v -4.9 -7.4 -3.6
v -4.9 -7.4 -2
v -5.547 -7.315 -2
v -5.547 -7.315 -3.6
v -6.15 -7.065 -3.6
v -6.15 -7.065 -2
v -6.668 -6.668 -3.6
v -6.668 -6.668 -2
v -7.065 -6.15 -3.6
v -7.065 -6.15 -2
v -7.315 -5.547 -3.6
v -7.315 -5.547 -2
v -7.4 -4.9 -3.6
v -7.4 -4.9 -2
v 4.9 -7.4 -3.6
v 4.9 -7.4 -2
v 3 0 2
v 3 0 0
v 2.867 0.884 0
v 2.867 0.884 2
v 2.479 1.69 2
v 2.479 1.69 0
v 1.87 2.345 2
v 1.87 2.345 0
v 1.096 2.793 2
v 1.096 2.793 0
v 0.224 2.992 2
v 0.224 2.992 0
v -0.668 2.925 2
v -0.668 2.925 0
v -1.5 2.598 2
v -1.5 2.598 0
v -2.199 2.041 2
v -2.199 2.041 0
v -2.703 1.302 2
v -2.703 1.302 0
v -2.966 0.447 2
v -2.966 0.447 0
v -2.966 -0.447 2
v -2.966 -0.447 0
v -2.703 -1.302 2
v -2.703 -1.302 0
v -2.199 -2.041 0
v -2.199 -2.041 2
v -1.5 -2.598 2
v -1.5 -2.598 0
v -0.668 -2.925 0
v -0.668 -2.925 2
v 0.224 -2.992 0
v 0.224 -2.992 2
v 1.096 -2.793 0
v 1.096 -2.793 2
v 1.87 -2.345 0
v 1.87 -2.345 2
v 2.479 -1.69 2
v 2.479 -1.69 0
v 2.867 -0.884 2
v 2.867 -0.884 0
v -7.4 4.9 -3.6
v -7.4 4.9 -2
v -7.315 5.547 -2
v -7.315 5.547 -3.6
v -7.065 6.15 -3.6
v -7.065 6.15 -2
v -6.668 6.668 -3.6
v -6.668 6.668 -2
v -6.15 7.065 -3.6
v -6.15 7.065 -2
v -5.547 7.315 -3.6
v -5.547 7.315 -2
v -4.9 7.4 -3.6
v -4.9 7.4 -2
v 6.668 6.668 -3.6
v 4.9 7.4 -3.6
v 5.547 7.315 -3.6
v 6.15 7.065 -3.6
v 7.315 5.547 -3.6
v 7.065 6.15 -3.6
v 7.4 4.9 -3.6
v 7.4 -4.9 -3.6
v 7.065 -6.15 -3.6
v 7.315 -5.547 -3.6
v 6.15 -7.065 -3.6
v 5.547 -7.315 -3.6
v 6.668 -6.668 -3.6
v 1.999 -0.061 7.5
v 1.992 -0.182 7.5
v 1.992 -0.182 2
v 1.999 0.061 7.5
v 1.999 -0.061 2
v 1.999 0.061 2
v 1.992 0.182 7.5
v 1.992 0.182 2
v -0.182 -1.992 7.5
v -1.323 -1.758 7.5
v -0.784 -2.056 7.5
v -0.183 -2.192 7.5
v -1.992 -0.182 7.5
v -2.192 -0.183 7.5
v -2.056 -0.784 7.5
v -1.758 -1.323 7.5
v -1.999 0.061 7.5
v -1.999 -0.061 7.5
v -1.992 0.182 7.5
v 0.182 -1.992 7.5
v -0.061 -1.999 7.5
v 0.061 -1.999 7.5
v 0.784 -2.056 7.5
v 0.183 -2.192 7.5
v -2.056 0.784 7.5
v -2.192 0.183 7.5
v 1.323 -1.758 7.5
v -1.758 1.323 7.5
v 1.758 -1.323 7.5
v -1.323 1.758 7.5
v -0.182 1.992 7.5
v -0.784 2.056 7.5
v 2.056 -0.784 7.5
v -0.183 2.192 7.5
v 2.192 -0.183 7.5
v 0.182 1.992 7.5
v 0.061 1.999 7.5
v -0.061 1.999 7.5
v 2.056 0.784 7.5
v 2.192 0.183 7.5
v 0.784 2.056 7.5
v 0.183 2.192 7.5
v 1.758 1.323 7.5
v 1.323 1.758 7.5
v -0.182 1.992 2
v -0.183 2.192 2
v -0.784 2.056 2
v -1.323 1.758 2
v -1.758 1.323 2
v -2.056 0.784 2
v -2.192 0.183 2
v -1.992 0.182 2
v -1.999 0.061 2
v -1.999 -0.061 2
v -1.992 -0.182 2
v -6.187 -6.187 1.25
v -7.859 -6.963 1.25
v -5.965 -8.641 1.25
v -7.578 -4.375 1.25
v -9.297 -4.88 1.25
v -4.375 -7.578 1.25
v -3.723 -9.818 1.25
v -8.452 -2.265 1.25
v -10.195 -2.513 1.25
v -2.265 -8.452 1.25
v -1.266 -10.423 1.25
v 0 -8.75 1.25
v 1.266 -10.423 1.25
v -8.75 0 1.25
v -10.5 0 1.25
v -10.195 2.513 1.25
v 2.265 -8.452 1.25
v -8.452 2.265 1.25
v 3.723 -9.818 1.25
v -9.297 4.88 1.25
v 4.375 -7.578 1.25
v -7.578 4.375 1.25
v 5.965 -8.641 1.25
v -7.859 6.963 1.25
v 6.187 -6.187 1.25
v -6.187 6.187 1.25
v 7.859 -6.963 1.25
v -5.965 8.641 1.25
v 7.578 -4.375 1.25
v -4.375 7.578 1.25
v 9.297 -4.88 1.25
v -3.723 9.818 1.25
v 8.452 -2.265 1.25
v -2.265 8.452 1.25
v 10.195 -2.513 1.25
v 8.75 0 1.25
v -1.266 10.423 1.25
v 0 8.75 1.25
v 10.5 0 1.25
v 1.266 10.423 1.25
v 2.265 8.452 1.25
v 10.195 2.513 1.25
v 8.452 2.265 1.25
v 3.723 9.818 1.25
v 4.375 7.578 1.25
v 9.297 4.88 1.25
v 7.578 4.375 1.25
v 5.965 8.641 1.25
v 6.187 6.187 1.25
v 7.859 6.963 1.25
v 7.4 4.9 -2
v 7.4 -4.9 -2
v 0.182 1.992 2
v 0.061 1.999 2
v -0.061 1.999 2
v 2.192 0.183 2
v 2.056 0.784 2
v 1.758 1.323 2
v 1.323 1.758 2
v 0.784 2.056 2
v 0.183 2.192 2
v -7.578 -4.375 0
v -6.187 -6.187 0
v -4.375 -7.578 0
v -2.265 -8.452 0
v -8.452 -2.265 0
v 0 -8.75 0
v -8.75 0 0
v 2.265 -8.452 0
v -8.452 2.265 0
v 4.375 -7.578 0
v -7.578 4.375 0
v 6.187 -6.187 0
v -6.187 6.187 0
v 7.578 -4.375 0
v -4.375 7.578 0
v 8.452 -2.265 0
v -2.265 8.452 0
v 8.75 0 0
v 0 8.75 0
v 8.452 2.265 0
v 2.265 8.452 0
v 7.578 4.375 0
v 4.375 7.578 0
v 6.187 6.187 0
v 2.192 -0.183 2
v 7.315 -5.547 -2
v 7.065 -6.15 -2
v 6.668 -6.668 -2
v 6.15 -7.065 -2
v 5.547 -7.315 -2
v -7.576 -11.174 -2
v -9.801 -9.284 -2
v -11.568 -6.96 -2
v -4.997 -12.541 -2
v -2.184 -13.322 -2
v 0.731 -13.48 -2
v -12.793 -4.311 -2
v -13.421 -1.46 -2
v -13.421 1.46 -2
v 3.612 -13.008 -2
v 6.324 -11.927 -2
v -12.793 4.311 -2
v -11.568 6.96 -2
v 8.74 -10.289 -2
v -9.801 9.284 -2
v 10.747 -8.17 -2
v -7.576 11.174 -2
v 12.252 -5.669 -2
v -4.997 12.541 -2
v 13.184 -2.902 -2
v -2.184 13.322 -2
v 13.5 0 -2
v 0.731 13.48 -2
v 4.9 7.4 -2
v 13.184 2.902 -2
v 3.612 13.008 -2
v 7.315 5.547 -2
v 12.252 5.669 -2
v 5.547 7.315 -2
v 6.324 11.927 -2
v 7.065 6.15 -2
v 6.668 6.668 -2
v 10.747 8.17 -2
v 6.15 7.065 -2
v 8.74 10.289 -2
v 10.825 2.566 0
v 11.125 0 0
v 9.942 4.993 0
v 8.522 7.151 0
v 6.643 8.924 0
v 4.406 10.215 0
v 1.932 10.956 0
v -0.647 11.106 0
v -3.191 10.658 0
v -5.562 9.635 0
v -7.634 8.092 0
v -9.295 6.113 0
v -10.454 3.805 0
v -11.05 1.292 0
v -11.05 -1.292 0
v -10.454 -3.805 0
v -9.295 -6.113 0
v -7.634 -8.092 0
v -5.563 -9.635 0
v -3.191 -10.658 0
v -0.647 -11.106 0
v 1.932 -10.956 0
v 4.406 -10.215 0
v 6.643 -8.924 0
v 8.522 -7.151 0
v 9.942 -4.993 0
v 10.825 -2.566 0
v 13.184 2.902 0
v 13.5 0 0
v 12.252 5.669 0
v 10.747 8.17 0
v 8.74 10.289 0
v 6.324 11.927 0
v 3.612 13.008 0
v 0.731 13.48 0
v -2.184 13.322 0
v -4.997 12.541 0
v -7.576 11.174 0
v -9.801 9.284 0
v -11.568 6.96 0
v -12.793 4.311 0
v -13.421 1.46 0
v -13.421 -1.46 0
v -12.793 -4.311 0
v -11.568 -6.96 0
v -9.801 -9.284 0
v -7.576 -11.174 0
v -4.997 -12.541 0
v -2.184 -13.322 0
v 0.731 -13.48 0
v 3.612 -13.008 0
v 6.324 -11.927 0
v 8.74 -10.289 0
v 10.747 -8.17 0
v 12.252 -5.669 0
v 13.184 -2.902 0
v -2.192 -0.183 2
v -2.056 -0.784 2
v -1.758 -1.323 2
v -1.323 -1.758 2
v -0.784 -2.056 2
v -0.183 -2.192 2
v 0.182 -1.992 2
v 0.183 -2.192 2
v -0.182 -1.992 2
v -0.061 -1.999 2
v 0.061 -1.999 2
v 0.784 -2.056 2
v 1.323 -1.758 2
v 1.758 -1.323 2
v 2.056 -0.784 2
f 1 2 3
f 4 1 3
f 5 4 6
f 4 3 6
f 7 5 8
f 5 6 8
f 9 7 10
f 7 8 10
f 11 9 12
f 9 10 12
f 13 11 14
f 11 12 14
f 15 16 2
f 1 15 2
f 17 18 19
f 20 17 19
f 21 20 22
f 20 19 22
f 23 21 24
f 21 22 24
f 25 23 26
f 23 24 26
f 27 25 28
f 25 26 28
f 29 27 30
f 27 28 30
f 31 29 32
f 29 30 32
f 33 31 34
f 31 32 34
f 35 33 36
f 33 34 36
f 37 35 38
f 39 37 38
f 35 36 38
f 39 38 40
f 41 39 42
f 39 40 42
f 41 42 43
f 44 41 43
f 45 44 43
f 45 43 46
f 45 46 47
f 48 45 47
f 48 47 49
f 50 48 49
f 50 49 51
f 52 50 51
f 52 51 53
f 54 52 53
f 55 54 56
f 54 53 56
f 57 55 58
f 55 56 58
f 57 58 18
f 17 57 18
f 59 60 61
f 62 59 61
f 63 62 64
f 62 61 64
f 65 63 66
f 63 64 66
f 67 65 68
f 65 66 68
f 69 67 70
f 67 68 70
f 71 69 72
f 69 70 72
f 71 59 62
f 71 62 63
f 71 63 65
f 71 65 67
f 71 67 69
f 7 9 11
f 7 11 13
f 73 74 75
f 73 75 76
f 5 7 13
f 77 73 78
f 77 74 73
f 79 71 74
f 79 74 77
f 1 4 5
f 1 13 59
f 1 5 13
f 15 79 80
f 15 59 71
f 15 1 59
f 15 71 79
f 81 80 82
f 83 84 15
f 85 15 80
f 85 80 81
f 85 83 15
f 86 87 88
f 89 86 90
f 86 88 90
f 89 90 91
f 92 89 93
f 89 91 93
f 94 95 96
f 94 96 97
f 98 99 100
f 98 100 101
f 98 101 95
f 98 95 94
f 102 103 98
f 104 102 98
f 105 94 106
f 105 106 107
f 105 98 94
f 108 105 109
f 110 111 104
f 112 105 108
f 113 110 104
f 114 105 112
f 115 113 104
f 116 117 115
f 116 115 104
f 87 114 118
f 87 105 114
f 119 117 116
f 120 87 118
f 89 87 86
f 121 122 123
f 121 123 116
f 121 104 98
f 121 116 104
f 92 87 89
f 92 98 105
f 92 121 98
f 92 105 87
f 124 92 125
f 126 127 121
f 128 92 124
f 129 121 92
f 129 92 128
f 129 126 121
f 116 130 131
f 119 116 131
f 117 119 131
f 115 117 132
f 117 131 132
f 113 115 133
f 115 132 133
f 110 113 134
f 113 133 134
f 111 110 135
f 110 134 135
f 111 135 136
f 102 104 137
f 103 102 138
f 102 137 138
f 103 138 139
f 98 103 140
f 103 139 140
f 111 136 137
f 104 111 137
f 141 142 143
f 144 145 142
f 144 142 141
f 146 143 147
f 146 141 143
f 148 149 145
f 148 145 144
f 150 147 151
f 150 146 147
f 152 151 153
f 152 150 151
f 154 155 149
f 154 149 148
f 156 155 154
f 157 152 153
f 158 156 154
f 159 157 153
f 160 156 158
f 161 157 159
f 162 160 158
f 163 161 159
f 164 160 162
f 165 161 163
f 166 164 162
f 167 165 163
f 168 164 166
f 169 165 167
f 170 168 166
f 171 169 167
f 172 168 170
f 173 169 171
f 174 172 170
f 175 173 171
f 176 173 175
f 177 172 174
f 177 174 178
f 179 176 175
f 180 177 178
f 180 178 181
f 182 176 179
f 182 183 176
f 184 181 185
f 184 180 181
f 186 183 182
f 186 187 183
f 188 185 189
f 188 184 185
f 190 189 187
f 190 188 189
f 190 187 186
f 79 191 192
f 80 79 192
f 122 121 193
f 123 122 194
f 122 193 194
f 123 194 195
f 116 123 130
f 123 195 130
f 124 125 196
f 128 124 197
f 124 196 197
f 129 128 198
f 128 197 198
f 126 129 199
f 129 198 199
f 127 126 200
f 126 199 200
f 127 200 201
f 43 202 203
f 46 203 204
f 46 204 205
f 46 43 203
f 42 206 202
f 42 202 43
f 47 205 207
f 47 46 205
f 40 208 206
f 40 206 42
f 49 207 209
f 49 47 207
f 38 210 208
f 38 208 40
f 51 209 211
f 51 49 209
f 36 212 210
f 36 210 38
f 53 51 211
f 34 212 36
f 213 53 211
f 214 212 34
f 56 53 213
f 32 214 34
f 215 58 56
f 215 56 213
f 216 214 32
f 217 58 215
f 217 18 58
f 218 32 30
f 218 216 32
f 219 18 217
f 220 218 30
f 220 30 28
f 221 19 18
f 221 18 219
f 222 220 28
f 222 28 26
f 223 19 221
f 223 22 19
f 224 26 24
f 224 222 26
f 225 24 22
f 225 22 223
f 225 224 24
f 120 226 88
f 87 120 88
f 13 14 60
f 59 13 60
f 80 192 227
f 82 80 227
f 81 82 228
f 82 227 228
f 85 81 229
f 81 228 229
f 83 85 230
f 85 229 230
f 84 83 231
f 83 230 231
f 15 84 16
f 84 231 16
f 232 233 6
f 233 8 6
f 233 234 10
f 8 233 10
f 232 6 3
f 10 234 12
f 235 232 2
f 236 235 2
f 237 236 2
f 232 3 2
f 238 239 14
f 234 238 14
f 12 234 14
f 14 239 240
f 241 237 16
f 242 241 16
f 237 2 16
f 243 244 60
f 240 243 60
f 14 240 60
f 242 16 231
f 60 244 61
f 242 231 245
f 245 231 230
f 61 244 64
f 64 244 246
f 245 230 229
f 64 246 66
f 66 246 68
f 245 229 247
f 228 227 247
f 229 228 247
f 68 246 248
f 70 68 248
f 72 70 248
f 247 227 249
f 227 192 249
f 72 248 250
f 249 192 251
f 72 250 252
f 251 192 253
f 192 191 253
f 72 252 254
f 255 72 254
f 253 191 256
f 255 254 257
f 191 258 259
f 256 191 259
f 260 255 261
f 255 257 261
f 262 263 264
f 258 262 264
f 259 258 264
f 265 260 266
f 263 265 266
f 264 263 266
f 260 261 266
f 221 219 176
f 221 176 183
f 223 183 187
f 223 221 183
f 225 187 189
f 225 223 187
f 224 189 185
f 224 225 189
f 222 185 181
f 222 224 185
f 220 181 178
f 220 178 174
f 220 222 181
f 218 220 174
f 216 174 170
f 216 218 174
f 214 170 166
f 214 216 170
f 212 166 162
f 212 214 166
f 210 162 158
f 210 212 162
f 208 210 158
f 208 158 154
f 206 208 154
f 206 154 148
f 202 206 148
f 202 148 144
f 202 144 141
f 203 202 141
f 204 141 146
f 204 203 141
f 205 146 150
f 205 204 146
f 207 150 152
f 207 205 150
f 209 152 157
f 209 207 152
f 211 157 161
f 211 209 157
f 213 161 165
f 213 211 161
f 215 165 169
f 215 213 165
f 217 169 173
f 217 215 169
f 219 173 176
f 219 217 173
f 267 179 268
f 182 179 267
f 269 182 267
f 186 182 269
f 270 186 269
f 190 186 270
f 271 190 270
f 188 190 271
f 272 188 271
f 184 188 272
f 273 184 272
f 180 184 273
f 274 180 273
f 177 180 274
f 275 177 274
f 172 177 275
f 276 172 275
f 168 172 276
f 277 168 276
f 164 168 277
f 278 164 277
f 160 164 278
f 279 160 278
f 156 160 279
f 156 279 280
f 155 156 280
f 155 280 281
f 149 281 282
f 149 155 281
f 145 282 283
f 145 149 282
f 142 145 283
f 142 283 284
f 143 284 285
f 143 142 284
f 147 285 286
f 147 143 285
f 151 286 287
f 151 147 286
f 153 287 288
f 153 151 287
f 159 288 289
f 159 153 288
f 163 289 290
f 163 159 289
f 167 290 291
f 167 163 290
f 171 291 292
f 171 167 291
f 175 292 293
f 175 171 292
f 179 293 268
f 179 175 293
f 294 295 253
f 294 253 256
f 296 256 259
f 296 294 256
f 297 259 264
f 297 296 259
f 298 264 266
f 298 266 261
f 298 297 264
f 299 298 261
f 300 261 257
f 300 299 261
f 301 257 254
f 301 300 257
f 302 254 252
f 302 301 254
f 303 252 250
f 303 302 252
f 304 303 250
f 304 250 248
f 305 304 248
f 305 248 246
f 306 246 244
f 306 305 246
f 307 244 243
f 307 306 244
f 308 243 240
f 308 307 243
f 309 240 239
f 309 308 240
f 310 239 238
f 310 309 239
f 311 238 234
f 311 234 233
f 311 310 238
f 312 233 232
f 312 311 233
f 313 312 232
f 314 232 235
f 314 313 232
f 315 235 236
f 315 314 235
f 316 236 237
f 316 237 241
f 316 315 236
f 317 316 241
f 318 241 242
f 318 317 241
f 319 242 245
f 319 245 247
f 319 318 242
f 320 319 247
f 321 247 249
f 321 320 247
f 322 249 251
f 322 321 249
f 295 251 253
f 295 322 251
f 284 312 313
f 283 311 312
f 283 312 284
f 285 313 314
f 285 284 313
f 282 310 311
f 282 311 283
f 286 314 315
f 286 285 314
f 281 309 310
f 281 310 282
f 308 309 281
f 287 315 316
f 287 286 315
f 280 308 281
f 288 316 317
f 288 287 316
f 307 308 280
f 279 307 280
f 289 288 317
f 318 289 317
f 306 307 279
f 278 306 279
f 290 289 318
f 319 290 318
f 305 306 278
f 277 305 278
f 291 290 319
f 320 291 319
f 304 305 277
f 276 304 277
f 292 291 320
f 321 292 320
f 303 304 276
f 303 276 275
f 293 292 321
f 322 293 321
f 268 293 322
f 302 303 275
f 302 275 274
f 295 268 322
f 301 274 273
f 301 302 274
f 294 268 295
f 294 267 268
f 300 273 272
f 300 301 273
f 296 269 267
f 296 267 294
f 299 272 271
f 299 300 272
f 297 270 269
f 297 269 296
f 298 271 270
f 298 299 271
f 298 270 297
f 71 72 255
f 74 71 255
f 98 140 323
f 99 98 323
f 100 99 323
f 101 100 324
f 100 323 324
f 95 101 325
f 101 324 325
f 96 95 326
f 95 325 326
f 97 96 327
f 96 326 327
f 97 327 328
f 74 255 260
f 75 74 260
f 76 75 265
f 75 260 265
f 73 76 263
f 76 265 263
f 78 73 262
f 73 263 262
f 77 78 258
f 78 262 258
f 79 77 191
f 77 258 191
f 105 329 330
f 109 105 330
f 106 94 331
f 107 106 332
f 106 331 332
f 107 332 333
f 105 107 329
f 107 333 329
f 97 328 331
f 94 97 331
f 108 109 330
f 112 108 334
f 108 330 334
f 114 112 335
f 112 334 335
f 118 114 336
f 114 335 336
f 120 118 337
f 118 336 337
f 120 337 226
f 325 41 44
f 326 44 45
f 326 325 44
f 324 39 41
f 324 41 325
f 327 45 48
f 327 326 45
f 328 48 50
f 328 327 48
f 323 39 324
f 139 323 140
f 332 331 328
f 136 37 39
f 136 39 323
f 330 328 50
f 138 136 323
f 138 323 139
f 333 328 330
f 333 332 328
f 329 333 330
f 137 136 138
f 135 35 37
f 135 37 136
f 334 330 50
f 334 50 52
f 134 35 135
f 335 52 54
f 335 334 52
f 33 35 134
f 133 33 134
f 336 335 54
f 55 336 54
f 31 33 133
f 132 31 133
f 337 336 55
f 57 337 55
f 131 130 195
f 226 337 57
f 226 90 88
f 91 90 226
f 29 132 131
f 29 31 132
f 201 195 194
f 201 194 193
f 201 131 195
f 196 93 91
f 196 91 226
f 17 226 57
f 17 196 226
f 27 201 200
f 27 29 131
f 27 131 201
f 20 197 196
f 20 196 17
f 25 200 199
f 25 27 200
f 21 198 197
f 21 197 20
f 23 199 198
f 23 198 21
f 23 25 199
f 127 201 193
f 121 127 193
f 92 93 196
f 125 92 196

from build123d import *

# Parameters (mm, degrees)
F0_R      = 13.5
F0_R_2    = 11.25
F0_R_3    = 10.5
F0_R_4    = 8.75
F0_R_5    = 3
F0_R_6    = 2.2
F1_DEPTH  = 2
F4_DEPTH  = 1.25
F6_DEPTH  = 2
F7_DEPTH  = 2
F8_DEPTH  = 6.25
F11_DEPTH = 1.6


# Not quite as in the source:
# - a fillet or chamfer that OpenCascade refuses, or shapes differently, is made with other operations: its cross-section is extruded or revolved along the edge and cut away or added


with BuildPart() as f1:
    # F0 (on Top) → F1 (new body)
    with BuildSketch(Plane.XY):
        Circle(F0_R)
        Circle(F0_R_2, mode=Mode.SUBTRACT)
        Circle(F0_R_2)
        Circle(F0_R_3, mode=Mode.SUBTRACT)
        Circle(F0_R_3)
        Circle(F0_R_4, mode=Mode.SUBTRACT)
        Circle(F0_R_4)
        Circle(F0_R_5, mode=Mode.SUBTRACT)
        Circle(F0_R_5)
        Circle(F0_R_6, mode=Mode.SUBTRACT)
        Circle(F0_R_6)
    extrude(amount=-F1_DEPTH)

    # F0 (on Top) → F4 (join)
    with BuildSketch(Plane.XY):
        Circle(F0_R_2)
        Circle(F0_R_3, mode=Mode.SUBTRACT)
        Circle(F0_R_3)
        Circle(F0_R_4, mode=Mode.SUBTRACT)
    extrude(amount=F4_DEPTH)

    # F5: chamfer of 1.5 x 0.75 on 1 edges, made by hand


with BuildPart() as f5_tool2:
    # F5_s3 → F5_t4 (revolve)
    with BuildSketch(Plane.XZ):
        Polygon((11.25, -0.25), (10.5, 1.25), (11.25, 1.25), align=None)
    revolve(axis=Axis((0, 0, 1.25), (0, 0, 1)))

    split(bisect_by=Plane.XY, keep=Keep.TOP)


with BuildPart() as f1_1:
    add(f1.part)

    # F5_t1: cut F5_tool2
    add(f5_tool2.part, mode=Mode.SUBTRACT)

    # F0 (on Top) → F6 (join)
    with BuildSketch(Plane.XY):
        Circle(F0_R_5)
        Circle(F0_R_6, mode=Mode.SUBTRACT)
    extrude(amount=F6_DEPTH)

    # F0 (on Top) → F7 (join)
    with BuildSketch(Plane.XY):
        Circle(F0_R_6)
    extrude(amount=F7_DEPTH)

    # F3 (on offset) → F8 (join)
    with BuildSketch(Plane.XY.offset(1.25)):
        with BuildLine():
            Line((-0.1818181818, 1.9917183909), (-0.1833333333, 2.1923478029))
            ThreePointArc((-0.1833333333, 2.1923478029), (-1.5556349186, 1.5556349186), (-2.1923478029, 0.1833333333))
            Line((-2.1923478029, 0.1833333333), (-1.9917183909, 0.1818181818))
            ThreePointArc((-1.9917183909, 0.1818181818), (-2, 0), (-1.9917183909, -0.1818181818))
            Line((-1.9917183909, -0.1818181818), (-2.1923478029, -0.1833333333))
            ThreePointArc((-2.1923478029, -0.1833333333), (-1.5556349186, -1.5556349186), (-0.1833333333, -2.1923478029))
            Line((-0.1833333333, -2.1923478029), (-0.1818181818, -1.9917183909))
            ThreePointArc((-0.1818181818, -1.9917183909), (0, -2), (0.1818181818, -1.9917183909))
            Line((0.1818181818, -1.9917183909), (0.1833333333, -2.1923478029))
            ThreePointArc((0.1833333333, -2.1923478029), (1.5556349186, -1.5556349186), (2.1923478029, -0.1833333333))
            Line((2.1923478029, -0.1833333333), (1.9917183909, -0.1818181818))
            ThreePointArc((1.9917183909, -0.1818181818), (2, 0), (1.9917183909, 0.1818181818))
            Line((1.9917183909, 0.1818181818), (2.1923478029, 0.1833333333))
            ThreePointArc((2.1923478029, 0.1833333333), (1.5556349186, 1.5556349186), (0.1833333333, 2.1923478029))
            Line((0.1833333333, 2.1923478029), (0.1818181818, 1.9917183909))
            ThreePointArc((0.1818181818, 1.9917183909), (0, 2), (-0.1818181818, 1.9917183909))
        make_face()
    extrude(amount=F8_DEPTH)

    # F10 (on offset) → F11 (join)
    with BuildSketch(Plane(origin=(0, 0, -2), x_dir=(1, 0, 0), z_dir=(0, 0, -1))):
        with BuildLine():
            Line((-4.9, -7.4), (4.9, -7.4))
            ThreePointArc((4.9, -7.4), (6.667766953, -6.667766953), (7.4, -4.9))
            Line((7.4, -4.9), (7.4, 4.9))
            ThreePointArc((7.4, 4.9), (6.667766953, 6.667766953), (4.9, 7.4))
            Line((4.9, 7.4), (-4.9, 7.4))
            ThreePointArc((-4.9, 7.4), (-6.667766953, 6.667766953), (-7.4, 4.9))
            Line((-7.4, 4.9), (-7.4, -4.9))
            ThreePointArc((-7.4, -4.9), (-6.667766953, -6.667766953), (-4.9, -7.4))
        make_face()
    extrude(amount=F11_DEPTH)


solid = f1_1.part
